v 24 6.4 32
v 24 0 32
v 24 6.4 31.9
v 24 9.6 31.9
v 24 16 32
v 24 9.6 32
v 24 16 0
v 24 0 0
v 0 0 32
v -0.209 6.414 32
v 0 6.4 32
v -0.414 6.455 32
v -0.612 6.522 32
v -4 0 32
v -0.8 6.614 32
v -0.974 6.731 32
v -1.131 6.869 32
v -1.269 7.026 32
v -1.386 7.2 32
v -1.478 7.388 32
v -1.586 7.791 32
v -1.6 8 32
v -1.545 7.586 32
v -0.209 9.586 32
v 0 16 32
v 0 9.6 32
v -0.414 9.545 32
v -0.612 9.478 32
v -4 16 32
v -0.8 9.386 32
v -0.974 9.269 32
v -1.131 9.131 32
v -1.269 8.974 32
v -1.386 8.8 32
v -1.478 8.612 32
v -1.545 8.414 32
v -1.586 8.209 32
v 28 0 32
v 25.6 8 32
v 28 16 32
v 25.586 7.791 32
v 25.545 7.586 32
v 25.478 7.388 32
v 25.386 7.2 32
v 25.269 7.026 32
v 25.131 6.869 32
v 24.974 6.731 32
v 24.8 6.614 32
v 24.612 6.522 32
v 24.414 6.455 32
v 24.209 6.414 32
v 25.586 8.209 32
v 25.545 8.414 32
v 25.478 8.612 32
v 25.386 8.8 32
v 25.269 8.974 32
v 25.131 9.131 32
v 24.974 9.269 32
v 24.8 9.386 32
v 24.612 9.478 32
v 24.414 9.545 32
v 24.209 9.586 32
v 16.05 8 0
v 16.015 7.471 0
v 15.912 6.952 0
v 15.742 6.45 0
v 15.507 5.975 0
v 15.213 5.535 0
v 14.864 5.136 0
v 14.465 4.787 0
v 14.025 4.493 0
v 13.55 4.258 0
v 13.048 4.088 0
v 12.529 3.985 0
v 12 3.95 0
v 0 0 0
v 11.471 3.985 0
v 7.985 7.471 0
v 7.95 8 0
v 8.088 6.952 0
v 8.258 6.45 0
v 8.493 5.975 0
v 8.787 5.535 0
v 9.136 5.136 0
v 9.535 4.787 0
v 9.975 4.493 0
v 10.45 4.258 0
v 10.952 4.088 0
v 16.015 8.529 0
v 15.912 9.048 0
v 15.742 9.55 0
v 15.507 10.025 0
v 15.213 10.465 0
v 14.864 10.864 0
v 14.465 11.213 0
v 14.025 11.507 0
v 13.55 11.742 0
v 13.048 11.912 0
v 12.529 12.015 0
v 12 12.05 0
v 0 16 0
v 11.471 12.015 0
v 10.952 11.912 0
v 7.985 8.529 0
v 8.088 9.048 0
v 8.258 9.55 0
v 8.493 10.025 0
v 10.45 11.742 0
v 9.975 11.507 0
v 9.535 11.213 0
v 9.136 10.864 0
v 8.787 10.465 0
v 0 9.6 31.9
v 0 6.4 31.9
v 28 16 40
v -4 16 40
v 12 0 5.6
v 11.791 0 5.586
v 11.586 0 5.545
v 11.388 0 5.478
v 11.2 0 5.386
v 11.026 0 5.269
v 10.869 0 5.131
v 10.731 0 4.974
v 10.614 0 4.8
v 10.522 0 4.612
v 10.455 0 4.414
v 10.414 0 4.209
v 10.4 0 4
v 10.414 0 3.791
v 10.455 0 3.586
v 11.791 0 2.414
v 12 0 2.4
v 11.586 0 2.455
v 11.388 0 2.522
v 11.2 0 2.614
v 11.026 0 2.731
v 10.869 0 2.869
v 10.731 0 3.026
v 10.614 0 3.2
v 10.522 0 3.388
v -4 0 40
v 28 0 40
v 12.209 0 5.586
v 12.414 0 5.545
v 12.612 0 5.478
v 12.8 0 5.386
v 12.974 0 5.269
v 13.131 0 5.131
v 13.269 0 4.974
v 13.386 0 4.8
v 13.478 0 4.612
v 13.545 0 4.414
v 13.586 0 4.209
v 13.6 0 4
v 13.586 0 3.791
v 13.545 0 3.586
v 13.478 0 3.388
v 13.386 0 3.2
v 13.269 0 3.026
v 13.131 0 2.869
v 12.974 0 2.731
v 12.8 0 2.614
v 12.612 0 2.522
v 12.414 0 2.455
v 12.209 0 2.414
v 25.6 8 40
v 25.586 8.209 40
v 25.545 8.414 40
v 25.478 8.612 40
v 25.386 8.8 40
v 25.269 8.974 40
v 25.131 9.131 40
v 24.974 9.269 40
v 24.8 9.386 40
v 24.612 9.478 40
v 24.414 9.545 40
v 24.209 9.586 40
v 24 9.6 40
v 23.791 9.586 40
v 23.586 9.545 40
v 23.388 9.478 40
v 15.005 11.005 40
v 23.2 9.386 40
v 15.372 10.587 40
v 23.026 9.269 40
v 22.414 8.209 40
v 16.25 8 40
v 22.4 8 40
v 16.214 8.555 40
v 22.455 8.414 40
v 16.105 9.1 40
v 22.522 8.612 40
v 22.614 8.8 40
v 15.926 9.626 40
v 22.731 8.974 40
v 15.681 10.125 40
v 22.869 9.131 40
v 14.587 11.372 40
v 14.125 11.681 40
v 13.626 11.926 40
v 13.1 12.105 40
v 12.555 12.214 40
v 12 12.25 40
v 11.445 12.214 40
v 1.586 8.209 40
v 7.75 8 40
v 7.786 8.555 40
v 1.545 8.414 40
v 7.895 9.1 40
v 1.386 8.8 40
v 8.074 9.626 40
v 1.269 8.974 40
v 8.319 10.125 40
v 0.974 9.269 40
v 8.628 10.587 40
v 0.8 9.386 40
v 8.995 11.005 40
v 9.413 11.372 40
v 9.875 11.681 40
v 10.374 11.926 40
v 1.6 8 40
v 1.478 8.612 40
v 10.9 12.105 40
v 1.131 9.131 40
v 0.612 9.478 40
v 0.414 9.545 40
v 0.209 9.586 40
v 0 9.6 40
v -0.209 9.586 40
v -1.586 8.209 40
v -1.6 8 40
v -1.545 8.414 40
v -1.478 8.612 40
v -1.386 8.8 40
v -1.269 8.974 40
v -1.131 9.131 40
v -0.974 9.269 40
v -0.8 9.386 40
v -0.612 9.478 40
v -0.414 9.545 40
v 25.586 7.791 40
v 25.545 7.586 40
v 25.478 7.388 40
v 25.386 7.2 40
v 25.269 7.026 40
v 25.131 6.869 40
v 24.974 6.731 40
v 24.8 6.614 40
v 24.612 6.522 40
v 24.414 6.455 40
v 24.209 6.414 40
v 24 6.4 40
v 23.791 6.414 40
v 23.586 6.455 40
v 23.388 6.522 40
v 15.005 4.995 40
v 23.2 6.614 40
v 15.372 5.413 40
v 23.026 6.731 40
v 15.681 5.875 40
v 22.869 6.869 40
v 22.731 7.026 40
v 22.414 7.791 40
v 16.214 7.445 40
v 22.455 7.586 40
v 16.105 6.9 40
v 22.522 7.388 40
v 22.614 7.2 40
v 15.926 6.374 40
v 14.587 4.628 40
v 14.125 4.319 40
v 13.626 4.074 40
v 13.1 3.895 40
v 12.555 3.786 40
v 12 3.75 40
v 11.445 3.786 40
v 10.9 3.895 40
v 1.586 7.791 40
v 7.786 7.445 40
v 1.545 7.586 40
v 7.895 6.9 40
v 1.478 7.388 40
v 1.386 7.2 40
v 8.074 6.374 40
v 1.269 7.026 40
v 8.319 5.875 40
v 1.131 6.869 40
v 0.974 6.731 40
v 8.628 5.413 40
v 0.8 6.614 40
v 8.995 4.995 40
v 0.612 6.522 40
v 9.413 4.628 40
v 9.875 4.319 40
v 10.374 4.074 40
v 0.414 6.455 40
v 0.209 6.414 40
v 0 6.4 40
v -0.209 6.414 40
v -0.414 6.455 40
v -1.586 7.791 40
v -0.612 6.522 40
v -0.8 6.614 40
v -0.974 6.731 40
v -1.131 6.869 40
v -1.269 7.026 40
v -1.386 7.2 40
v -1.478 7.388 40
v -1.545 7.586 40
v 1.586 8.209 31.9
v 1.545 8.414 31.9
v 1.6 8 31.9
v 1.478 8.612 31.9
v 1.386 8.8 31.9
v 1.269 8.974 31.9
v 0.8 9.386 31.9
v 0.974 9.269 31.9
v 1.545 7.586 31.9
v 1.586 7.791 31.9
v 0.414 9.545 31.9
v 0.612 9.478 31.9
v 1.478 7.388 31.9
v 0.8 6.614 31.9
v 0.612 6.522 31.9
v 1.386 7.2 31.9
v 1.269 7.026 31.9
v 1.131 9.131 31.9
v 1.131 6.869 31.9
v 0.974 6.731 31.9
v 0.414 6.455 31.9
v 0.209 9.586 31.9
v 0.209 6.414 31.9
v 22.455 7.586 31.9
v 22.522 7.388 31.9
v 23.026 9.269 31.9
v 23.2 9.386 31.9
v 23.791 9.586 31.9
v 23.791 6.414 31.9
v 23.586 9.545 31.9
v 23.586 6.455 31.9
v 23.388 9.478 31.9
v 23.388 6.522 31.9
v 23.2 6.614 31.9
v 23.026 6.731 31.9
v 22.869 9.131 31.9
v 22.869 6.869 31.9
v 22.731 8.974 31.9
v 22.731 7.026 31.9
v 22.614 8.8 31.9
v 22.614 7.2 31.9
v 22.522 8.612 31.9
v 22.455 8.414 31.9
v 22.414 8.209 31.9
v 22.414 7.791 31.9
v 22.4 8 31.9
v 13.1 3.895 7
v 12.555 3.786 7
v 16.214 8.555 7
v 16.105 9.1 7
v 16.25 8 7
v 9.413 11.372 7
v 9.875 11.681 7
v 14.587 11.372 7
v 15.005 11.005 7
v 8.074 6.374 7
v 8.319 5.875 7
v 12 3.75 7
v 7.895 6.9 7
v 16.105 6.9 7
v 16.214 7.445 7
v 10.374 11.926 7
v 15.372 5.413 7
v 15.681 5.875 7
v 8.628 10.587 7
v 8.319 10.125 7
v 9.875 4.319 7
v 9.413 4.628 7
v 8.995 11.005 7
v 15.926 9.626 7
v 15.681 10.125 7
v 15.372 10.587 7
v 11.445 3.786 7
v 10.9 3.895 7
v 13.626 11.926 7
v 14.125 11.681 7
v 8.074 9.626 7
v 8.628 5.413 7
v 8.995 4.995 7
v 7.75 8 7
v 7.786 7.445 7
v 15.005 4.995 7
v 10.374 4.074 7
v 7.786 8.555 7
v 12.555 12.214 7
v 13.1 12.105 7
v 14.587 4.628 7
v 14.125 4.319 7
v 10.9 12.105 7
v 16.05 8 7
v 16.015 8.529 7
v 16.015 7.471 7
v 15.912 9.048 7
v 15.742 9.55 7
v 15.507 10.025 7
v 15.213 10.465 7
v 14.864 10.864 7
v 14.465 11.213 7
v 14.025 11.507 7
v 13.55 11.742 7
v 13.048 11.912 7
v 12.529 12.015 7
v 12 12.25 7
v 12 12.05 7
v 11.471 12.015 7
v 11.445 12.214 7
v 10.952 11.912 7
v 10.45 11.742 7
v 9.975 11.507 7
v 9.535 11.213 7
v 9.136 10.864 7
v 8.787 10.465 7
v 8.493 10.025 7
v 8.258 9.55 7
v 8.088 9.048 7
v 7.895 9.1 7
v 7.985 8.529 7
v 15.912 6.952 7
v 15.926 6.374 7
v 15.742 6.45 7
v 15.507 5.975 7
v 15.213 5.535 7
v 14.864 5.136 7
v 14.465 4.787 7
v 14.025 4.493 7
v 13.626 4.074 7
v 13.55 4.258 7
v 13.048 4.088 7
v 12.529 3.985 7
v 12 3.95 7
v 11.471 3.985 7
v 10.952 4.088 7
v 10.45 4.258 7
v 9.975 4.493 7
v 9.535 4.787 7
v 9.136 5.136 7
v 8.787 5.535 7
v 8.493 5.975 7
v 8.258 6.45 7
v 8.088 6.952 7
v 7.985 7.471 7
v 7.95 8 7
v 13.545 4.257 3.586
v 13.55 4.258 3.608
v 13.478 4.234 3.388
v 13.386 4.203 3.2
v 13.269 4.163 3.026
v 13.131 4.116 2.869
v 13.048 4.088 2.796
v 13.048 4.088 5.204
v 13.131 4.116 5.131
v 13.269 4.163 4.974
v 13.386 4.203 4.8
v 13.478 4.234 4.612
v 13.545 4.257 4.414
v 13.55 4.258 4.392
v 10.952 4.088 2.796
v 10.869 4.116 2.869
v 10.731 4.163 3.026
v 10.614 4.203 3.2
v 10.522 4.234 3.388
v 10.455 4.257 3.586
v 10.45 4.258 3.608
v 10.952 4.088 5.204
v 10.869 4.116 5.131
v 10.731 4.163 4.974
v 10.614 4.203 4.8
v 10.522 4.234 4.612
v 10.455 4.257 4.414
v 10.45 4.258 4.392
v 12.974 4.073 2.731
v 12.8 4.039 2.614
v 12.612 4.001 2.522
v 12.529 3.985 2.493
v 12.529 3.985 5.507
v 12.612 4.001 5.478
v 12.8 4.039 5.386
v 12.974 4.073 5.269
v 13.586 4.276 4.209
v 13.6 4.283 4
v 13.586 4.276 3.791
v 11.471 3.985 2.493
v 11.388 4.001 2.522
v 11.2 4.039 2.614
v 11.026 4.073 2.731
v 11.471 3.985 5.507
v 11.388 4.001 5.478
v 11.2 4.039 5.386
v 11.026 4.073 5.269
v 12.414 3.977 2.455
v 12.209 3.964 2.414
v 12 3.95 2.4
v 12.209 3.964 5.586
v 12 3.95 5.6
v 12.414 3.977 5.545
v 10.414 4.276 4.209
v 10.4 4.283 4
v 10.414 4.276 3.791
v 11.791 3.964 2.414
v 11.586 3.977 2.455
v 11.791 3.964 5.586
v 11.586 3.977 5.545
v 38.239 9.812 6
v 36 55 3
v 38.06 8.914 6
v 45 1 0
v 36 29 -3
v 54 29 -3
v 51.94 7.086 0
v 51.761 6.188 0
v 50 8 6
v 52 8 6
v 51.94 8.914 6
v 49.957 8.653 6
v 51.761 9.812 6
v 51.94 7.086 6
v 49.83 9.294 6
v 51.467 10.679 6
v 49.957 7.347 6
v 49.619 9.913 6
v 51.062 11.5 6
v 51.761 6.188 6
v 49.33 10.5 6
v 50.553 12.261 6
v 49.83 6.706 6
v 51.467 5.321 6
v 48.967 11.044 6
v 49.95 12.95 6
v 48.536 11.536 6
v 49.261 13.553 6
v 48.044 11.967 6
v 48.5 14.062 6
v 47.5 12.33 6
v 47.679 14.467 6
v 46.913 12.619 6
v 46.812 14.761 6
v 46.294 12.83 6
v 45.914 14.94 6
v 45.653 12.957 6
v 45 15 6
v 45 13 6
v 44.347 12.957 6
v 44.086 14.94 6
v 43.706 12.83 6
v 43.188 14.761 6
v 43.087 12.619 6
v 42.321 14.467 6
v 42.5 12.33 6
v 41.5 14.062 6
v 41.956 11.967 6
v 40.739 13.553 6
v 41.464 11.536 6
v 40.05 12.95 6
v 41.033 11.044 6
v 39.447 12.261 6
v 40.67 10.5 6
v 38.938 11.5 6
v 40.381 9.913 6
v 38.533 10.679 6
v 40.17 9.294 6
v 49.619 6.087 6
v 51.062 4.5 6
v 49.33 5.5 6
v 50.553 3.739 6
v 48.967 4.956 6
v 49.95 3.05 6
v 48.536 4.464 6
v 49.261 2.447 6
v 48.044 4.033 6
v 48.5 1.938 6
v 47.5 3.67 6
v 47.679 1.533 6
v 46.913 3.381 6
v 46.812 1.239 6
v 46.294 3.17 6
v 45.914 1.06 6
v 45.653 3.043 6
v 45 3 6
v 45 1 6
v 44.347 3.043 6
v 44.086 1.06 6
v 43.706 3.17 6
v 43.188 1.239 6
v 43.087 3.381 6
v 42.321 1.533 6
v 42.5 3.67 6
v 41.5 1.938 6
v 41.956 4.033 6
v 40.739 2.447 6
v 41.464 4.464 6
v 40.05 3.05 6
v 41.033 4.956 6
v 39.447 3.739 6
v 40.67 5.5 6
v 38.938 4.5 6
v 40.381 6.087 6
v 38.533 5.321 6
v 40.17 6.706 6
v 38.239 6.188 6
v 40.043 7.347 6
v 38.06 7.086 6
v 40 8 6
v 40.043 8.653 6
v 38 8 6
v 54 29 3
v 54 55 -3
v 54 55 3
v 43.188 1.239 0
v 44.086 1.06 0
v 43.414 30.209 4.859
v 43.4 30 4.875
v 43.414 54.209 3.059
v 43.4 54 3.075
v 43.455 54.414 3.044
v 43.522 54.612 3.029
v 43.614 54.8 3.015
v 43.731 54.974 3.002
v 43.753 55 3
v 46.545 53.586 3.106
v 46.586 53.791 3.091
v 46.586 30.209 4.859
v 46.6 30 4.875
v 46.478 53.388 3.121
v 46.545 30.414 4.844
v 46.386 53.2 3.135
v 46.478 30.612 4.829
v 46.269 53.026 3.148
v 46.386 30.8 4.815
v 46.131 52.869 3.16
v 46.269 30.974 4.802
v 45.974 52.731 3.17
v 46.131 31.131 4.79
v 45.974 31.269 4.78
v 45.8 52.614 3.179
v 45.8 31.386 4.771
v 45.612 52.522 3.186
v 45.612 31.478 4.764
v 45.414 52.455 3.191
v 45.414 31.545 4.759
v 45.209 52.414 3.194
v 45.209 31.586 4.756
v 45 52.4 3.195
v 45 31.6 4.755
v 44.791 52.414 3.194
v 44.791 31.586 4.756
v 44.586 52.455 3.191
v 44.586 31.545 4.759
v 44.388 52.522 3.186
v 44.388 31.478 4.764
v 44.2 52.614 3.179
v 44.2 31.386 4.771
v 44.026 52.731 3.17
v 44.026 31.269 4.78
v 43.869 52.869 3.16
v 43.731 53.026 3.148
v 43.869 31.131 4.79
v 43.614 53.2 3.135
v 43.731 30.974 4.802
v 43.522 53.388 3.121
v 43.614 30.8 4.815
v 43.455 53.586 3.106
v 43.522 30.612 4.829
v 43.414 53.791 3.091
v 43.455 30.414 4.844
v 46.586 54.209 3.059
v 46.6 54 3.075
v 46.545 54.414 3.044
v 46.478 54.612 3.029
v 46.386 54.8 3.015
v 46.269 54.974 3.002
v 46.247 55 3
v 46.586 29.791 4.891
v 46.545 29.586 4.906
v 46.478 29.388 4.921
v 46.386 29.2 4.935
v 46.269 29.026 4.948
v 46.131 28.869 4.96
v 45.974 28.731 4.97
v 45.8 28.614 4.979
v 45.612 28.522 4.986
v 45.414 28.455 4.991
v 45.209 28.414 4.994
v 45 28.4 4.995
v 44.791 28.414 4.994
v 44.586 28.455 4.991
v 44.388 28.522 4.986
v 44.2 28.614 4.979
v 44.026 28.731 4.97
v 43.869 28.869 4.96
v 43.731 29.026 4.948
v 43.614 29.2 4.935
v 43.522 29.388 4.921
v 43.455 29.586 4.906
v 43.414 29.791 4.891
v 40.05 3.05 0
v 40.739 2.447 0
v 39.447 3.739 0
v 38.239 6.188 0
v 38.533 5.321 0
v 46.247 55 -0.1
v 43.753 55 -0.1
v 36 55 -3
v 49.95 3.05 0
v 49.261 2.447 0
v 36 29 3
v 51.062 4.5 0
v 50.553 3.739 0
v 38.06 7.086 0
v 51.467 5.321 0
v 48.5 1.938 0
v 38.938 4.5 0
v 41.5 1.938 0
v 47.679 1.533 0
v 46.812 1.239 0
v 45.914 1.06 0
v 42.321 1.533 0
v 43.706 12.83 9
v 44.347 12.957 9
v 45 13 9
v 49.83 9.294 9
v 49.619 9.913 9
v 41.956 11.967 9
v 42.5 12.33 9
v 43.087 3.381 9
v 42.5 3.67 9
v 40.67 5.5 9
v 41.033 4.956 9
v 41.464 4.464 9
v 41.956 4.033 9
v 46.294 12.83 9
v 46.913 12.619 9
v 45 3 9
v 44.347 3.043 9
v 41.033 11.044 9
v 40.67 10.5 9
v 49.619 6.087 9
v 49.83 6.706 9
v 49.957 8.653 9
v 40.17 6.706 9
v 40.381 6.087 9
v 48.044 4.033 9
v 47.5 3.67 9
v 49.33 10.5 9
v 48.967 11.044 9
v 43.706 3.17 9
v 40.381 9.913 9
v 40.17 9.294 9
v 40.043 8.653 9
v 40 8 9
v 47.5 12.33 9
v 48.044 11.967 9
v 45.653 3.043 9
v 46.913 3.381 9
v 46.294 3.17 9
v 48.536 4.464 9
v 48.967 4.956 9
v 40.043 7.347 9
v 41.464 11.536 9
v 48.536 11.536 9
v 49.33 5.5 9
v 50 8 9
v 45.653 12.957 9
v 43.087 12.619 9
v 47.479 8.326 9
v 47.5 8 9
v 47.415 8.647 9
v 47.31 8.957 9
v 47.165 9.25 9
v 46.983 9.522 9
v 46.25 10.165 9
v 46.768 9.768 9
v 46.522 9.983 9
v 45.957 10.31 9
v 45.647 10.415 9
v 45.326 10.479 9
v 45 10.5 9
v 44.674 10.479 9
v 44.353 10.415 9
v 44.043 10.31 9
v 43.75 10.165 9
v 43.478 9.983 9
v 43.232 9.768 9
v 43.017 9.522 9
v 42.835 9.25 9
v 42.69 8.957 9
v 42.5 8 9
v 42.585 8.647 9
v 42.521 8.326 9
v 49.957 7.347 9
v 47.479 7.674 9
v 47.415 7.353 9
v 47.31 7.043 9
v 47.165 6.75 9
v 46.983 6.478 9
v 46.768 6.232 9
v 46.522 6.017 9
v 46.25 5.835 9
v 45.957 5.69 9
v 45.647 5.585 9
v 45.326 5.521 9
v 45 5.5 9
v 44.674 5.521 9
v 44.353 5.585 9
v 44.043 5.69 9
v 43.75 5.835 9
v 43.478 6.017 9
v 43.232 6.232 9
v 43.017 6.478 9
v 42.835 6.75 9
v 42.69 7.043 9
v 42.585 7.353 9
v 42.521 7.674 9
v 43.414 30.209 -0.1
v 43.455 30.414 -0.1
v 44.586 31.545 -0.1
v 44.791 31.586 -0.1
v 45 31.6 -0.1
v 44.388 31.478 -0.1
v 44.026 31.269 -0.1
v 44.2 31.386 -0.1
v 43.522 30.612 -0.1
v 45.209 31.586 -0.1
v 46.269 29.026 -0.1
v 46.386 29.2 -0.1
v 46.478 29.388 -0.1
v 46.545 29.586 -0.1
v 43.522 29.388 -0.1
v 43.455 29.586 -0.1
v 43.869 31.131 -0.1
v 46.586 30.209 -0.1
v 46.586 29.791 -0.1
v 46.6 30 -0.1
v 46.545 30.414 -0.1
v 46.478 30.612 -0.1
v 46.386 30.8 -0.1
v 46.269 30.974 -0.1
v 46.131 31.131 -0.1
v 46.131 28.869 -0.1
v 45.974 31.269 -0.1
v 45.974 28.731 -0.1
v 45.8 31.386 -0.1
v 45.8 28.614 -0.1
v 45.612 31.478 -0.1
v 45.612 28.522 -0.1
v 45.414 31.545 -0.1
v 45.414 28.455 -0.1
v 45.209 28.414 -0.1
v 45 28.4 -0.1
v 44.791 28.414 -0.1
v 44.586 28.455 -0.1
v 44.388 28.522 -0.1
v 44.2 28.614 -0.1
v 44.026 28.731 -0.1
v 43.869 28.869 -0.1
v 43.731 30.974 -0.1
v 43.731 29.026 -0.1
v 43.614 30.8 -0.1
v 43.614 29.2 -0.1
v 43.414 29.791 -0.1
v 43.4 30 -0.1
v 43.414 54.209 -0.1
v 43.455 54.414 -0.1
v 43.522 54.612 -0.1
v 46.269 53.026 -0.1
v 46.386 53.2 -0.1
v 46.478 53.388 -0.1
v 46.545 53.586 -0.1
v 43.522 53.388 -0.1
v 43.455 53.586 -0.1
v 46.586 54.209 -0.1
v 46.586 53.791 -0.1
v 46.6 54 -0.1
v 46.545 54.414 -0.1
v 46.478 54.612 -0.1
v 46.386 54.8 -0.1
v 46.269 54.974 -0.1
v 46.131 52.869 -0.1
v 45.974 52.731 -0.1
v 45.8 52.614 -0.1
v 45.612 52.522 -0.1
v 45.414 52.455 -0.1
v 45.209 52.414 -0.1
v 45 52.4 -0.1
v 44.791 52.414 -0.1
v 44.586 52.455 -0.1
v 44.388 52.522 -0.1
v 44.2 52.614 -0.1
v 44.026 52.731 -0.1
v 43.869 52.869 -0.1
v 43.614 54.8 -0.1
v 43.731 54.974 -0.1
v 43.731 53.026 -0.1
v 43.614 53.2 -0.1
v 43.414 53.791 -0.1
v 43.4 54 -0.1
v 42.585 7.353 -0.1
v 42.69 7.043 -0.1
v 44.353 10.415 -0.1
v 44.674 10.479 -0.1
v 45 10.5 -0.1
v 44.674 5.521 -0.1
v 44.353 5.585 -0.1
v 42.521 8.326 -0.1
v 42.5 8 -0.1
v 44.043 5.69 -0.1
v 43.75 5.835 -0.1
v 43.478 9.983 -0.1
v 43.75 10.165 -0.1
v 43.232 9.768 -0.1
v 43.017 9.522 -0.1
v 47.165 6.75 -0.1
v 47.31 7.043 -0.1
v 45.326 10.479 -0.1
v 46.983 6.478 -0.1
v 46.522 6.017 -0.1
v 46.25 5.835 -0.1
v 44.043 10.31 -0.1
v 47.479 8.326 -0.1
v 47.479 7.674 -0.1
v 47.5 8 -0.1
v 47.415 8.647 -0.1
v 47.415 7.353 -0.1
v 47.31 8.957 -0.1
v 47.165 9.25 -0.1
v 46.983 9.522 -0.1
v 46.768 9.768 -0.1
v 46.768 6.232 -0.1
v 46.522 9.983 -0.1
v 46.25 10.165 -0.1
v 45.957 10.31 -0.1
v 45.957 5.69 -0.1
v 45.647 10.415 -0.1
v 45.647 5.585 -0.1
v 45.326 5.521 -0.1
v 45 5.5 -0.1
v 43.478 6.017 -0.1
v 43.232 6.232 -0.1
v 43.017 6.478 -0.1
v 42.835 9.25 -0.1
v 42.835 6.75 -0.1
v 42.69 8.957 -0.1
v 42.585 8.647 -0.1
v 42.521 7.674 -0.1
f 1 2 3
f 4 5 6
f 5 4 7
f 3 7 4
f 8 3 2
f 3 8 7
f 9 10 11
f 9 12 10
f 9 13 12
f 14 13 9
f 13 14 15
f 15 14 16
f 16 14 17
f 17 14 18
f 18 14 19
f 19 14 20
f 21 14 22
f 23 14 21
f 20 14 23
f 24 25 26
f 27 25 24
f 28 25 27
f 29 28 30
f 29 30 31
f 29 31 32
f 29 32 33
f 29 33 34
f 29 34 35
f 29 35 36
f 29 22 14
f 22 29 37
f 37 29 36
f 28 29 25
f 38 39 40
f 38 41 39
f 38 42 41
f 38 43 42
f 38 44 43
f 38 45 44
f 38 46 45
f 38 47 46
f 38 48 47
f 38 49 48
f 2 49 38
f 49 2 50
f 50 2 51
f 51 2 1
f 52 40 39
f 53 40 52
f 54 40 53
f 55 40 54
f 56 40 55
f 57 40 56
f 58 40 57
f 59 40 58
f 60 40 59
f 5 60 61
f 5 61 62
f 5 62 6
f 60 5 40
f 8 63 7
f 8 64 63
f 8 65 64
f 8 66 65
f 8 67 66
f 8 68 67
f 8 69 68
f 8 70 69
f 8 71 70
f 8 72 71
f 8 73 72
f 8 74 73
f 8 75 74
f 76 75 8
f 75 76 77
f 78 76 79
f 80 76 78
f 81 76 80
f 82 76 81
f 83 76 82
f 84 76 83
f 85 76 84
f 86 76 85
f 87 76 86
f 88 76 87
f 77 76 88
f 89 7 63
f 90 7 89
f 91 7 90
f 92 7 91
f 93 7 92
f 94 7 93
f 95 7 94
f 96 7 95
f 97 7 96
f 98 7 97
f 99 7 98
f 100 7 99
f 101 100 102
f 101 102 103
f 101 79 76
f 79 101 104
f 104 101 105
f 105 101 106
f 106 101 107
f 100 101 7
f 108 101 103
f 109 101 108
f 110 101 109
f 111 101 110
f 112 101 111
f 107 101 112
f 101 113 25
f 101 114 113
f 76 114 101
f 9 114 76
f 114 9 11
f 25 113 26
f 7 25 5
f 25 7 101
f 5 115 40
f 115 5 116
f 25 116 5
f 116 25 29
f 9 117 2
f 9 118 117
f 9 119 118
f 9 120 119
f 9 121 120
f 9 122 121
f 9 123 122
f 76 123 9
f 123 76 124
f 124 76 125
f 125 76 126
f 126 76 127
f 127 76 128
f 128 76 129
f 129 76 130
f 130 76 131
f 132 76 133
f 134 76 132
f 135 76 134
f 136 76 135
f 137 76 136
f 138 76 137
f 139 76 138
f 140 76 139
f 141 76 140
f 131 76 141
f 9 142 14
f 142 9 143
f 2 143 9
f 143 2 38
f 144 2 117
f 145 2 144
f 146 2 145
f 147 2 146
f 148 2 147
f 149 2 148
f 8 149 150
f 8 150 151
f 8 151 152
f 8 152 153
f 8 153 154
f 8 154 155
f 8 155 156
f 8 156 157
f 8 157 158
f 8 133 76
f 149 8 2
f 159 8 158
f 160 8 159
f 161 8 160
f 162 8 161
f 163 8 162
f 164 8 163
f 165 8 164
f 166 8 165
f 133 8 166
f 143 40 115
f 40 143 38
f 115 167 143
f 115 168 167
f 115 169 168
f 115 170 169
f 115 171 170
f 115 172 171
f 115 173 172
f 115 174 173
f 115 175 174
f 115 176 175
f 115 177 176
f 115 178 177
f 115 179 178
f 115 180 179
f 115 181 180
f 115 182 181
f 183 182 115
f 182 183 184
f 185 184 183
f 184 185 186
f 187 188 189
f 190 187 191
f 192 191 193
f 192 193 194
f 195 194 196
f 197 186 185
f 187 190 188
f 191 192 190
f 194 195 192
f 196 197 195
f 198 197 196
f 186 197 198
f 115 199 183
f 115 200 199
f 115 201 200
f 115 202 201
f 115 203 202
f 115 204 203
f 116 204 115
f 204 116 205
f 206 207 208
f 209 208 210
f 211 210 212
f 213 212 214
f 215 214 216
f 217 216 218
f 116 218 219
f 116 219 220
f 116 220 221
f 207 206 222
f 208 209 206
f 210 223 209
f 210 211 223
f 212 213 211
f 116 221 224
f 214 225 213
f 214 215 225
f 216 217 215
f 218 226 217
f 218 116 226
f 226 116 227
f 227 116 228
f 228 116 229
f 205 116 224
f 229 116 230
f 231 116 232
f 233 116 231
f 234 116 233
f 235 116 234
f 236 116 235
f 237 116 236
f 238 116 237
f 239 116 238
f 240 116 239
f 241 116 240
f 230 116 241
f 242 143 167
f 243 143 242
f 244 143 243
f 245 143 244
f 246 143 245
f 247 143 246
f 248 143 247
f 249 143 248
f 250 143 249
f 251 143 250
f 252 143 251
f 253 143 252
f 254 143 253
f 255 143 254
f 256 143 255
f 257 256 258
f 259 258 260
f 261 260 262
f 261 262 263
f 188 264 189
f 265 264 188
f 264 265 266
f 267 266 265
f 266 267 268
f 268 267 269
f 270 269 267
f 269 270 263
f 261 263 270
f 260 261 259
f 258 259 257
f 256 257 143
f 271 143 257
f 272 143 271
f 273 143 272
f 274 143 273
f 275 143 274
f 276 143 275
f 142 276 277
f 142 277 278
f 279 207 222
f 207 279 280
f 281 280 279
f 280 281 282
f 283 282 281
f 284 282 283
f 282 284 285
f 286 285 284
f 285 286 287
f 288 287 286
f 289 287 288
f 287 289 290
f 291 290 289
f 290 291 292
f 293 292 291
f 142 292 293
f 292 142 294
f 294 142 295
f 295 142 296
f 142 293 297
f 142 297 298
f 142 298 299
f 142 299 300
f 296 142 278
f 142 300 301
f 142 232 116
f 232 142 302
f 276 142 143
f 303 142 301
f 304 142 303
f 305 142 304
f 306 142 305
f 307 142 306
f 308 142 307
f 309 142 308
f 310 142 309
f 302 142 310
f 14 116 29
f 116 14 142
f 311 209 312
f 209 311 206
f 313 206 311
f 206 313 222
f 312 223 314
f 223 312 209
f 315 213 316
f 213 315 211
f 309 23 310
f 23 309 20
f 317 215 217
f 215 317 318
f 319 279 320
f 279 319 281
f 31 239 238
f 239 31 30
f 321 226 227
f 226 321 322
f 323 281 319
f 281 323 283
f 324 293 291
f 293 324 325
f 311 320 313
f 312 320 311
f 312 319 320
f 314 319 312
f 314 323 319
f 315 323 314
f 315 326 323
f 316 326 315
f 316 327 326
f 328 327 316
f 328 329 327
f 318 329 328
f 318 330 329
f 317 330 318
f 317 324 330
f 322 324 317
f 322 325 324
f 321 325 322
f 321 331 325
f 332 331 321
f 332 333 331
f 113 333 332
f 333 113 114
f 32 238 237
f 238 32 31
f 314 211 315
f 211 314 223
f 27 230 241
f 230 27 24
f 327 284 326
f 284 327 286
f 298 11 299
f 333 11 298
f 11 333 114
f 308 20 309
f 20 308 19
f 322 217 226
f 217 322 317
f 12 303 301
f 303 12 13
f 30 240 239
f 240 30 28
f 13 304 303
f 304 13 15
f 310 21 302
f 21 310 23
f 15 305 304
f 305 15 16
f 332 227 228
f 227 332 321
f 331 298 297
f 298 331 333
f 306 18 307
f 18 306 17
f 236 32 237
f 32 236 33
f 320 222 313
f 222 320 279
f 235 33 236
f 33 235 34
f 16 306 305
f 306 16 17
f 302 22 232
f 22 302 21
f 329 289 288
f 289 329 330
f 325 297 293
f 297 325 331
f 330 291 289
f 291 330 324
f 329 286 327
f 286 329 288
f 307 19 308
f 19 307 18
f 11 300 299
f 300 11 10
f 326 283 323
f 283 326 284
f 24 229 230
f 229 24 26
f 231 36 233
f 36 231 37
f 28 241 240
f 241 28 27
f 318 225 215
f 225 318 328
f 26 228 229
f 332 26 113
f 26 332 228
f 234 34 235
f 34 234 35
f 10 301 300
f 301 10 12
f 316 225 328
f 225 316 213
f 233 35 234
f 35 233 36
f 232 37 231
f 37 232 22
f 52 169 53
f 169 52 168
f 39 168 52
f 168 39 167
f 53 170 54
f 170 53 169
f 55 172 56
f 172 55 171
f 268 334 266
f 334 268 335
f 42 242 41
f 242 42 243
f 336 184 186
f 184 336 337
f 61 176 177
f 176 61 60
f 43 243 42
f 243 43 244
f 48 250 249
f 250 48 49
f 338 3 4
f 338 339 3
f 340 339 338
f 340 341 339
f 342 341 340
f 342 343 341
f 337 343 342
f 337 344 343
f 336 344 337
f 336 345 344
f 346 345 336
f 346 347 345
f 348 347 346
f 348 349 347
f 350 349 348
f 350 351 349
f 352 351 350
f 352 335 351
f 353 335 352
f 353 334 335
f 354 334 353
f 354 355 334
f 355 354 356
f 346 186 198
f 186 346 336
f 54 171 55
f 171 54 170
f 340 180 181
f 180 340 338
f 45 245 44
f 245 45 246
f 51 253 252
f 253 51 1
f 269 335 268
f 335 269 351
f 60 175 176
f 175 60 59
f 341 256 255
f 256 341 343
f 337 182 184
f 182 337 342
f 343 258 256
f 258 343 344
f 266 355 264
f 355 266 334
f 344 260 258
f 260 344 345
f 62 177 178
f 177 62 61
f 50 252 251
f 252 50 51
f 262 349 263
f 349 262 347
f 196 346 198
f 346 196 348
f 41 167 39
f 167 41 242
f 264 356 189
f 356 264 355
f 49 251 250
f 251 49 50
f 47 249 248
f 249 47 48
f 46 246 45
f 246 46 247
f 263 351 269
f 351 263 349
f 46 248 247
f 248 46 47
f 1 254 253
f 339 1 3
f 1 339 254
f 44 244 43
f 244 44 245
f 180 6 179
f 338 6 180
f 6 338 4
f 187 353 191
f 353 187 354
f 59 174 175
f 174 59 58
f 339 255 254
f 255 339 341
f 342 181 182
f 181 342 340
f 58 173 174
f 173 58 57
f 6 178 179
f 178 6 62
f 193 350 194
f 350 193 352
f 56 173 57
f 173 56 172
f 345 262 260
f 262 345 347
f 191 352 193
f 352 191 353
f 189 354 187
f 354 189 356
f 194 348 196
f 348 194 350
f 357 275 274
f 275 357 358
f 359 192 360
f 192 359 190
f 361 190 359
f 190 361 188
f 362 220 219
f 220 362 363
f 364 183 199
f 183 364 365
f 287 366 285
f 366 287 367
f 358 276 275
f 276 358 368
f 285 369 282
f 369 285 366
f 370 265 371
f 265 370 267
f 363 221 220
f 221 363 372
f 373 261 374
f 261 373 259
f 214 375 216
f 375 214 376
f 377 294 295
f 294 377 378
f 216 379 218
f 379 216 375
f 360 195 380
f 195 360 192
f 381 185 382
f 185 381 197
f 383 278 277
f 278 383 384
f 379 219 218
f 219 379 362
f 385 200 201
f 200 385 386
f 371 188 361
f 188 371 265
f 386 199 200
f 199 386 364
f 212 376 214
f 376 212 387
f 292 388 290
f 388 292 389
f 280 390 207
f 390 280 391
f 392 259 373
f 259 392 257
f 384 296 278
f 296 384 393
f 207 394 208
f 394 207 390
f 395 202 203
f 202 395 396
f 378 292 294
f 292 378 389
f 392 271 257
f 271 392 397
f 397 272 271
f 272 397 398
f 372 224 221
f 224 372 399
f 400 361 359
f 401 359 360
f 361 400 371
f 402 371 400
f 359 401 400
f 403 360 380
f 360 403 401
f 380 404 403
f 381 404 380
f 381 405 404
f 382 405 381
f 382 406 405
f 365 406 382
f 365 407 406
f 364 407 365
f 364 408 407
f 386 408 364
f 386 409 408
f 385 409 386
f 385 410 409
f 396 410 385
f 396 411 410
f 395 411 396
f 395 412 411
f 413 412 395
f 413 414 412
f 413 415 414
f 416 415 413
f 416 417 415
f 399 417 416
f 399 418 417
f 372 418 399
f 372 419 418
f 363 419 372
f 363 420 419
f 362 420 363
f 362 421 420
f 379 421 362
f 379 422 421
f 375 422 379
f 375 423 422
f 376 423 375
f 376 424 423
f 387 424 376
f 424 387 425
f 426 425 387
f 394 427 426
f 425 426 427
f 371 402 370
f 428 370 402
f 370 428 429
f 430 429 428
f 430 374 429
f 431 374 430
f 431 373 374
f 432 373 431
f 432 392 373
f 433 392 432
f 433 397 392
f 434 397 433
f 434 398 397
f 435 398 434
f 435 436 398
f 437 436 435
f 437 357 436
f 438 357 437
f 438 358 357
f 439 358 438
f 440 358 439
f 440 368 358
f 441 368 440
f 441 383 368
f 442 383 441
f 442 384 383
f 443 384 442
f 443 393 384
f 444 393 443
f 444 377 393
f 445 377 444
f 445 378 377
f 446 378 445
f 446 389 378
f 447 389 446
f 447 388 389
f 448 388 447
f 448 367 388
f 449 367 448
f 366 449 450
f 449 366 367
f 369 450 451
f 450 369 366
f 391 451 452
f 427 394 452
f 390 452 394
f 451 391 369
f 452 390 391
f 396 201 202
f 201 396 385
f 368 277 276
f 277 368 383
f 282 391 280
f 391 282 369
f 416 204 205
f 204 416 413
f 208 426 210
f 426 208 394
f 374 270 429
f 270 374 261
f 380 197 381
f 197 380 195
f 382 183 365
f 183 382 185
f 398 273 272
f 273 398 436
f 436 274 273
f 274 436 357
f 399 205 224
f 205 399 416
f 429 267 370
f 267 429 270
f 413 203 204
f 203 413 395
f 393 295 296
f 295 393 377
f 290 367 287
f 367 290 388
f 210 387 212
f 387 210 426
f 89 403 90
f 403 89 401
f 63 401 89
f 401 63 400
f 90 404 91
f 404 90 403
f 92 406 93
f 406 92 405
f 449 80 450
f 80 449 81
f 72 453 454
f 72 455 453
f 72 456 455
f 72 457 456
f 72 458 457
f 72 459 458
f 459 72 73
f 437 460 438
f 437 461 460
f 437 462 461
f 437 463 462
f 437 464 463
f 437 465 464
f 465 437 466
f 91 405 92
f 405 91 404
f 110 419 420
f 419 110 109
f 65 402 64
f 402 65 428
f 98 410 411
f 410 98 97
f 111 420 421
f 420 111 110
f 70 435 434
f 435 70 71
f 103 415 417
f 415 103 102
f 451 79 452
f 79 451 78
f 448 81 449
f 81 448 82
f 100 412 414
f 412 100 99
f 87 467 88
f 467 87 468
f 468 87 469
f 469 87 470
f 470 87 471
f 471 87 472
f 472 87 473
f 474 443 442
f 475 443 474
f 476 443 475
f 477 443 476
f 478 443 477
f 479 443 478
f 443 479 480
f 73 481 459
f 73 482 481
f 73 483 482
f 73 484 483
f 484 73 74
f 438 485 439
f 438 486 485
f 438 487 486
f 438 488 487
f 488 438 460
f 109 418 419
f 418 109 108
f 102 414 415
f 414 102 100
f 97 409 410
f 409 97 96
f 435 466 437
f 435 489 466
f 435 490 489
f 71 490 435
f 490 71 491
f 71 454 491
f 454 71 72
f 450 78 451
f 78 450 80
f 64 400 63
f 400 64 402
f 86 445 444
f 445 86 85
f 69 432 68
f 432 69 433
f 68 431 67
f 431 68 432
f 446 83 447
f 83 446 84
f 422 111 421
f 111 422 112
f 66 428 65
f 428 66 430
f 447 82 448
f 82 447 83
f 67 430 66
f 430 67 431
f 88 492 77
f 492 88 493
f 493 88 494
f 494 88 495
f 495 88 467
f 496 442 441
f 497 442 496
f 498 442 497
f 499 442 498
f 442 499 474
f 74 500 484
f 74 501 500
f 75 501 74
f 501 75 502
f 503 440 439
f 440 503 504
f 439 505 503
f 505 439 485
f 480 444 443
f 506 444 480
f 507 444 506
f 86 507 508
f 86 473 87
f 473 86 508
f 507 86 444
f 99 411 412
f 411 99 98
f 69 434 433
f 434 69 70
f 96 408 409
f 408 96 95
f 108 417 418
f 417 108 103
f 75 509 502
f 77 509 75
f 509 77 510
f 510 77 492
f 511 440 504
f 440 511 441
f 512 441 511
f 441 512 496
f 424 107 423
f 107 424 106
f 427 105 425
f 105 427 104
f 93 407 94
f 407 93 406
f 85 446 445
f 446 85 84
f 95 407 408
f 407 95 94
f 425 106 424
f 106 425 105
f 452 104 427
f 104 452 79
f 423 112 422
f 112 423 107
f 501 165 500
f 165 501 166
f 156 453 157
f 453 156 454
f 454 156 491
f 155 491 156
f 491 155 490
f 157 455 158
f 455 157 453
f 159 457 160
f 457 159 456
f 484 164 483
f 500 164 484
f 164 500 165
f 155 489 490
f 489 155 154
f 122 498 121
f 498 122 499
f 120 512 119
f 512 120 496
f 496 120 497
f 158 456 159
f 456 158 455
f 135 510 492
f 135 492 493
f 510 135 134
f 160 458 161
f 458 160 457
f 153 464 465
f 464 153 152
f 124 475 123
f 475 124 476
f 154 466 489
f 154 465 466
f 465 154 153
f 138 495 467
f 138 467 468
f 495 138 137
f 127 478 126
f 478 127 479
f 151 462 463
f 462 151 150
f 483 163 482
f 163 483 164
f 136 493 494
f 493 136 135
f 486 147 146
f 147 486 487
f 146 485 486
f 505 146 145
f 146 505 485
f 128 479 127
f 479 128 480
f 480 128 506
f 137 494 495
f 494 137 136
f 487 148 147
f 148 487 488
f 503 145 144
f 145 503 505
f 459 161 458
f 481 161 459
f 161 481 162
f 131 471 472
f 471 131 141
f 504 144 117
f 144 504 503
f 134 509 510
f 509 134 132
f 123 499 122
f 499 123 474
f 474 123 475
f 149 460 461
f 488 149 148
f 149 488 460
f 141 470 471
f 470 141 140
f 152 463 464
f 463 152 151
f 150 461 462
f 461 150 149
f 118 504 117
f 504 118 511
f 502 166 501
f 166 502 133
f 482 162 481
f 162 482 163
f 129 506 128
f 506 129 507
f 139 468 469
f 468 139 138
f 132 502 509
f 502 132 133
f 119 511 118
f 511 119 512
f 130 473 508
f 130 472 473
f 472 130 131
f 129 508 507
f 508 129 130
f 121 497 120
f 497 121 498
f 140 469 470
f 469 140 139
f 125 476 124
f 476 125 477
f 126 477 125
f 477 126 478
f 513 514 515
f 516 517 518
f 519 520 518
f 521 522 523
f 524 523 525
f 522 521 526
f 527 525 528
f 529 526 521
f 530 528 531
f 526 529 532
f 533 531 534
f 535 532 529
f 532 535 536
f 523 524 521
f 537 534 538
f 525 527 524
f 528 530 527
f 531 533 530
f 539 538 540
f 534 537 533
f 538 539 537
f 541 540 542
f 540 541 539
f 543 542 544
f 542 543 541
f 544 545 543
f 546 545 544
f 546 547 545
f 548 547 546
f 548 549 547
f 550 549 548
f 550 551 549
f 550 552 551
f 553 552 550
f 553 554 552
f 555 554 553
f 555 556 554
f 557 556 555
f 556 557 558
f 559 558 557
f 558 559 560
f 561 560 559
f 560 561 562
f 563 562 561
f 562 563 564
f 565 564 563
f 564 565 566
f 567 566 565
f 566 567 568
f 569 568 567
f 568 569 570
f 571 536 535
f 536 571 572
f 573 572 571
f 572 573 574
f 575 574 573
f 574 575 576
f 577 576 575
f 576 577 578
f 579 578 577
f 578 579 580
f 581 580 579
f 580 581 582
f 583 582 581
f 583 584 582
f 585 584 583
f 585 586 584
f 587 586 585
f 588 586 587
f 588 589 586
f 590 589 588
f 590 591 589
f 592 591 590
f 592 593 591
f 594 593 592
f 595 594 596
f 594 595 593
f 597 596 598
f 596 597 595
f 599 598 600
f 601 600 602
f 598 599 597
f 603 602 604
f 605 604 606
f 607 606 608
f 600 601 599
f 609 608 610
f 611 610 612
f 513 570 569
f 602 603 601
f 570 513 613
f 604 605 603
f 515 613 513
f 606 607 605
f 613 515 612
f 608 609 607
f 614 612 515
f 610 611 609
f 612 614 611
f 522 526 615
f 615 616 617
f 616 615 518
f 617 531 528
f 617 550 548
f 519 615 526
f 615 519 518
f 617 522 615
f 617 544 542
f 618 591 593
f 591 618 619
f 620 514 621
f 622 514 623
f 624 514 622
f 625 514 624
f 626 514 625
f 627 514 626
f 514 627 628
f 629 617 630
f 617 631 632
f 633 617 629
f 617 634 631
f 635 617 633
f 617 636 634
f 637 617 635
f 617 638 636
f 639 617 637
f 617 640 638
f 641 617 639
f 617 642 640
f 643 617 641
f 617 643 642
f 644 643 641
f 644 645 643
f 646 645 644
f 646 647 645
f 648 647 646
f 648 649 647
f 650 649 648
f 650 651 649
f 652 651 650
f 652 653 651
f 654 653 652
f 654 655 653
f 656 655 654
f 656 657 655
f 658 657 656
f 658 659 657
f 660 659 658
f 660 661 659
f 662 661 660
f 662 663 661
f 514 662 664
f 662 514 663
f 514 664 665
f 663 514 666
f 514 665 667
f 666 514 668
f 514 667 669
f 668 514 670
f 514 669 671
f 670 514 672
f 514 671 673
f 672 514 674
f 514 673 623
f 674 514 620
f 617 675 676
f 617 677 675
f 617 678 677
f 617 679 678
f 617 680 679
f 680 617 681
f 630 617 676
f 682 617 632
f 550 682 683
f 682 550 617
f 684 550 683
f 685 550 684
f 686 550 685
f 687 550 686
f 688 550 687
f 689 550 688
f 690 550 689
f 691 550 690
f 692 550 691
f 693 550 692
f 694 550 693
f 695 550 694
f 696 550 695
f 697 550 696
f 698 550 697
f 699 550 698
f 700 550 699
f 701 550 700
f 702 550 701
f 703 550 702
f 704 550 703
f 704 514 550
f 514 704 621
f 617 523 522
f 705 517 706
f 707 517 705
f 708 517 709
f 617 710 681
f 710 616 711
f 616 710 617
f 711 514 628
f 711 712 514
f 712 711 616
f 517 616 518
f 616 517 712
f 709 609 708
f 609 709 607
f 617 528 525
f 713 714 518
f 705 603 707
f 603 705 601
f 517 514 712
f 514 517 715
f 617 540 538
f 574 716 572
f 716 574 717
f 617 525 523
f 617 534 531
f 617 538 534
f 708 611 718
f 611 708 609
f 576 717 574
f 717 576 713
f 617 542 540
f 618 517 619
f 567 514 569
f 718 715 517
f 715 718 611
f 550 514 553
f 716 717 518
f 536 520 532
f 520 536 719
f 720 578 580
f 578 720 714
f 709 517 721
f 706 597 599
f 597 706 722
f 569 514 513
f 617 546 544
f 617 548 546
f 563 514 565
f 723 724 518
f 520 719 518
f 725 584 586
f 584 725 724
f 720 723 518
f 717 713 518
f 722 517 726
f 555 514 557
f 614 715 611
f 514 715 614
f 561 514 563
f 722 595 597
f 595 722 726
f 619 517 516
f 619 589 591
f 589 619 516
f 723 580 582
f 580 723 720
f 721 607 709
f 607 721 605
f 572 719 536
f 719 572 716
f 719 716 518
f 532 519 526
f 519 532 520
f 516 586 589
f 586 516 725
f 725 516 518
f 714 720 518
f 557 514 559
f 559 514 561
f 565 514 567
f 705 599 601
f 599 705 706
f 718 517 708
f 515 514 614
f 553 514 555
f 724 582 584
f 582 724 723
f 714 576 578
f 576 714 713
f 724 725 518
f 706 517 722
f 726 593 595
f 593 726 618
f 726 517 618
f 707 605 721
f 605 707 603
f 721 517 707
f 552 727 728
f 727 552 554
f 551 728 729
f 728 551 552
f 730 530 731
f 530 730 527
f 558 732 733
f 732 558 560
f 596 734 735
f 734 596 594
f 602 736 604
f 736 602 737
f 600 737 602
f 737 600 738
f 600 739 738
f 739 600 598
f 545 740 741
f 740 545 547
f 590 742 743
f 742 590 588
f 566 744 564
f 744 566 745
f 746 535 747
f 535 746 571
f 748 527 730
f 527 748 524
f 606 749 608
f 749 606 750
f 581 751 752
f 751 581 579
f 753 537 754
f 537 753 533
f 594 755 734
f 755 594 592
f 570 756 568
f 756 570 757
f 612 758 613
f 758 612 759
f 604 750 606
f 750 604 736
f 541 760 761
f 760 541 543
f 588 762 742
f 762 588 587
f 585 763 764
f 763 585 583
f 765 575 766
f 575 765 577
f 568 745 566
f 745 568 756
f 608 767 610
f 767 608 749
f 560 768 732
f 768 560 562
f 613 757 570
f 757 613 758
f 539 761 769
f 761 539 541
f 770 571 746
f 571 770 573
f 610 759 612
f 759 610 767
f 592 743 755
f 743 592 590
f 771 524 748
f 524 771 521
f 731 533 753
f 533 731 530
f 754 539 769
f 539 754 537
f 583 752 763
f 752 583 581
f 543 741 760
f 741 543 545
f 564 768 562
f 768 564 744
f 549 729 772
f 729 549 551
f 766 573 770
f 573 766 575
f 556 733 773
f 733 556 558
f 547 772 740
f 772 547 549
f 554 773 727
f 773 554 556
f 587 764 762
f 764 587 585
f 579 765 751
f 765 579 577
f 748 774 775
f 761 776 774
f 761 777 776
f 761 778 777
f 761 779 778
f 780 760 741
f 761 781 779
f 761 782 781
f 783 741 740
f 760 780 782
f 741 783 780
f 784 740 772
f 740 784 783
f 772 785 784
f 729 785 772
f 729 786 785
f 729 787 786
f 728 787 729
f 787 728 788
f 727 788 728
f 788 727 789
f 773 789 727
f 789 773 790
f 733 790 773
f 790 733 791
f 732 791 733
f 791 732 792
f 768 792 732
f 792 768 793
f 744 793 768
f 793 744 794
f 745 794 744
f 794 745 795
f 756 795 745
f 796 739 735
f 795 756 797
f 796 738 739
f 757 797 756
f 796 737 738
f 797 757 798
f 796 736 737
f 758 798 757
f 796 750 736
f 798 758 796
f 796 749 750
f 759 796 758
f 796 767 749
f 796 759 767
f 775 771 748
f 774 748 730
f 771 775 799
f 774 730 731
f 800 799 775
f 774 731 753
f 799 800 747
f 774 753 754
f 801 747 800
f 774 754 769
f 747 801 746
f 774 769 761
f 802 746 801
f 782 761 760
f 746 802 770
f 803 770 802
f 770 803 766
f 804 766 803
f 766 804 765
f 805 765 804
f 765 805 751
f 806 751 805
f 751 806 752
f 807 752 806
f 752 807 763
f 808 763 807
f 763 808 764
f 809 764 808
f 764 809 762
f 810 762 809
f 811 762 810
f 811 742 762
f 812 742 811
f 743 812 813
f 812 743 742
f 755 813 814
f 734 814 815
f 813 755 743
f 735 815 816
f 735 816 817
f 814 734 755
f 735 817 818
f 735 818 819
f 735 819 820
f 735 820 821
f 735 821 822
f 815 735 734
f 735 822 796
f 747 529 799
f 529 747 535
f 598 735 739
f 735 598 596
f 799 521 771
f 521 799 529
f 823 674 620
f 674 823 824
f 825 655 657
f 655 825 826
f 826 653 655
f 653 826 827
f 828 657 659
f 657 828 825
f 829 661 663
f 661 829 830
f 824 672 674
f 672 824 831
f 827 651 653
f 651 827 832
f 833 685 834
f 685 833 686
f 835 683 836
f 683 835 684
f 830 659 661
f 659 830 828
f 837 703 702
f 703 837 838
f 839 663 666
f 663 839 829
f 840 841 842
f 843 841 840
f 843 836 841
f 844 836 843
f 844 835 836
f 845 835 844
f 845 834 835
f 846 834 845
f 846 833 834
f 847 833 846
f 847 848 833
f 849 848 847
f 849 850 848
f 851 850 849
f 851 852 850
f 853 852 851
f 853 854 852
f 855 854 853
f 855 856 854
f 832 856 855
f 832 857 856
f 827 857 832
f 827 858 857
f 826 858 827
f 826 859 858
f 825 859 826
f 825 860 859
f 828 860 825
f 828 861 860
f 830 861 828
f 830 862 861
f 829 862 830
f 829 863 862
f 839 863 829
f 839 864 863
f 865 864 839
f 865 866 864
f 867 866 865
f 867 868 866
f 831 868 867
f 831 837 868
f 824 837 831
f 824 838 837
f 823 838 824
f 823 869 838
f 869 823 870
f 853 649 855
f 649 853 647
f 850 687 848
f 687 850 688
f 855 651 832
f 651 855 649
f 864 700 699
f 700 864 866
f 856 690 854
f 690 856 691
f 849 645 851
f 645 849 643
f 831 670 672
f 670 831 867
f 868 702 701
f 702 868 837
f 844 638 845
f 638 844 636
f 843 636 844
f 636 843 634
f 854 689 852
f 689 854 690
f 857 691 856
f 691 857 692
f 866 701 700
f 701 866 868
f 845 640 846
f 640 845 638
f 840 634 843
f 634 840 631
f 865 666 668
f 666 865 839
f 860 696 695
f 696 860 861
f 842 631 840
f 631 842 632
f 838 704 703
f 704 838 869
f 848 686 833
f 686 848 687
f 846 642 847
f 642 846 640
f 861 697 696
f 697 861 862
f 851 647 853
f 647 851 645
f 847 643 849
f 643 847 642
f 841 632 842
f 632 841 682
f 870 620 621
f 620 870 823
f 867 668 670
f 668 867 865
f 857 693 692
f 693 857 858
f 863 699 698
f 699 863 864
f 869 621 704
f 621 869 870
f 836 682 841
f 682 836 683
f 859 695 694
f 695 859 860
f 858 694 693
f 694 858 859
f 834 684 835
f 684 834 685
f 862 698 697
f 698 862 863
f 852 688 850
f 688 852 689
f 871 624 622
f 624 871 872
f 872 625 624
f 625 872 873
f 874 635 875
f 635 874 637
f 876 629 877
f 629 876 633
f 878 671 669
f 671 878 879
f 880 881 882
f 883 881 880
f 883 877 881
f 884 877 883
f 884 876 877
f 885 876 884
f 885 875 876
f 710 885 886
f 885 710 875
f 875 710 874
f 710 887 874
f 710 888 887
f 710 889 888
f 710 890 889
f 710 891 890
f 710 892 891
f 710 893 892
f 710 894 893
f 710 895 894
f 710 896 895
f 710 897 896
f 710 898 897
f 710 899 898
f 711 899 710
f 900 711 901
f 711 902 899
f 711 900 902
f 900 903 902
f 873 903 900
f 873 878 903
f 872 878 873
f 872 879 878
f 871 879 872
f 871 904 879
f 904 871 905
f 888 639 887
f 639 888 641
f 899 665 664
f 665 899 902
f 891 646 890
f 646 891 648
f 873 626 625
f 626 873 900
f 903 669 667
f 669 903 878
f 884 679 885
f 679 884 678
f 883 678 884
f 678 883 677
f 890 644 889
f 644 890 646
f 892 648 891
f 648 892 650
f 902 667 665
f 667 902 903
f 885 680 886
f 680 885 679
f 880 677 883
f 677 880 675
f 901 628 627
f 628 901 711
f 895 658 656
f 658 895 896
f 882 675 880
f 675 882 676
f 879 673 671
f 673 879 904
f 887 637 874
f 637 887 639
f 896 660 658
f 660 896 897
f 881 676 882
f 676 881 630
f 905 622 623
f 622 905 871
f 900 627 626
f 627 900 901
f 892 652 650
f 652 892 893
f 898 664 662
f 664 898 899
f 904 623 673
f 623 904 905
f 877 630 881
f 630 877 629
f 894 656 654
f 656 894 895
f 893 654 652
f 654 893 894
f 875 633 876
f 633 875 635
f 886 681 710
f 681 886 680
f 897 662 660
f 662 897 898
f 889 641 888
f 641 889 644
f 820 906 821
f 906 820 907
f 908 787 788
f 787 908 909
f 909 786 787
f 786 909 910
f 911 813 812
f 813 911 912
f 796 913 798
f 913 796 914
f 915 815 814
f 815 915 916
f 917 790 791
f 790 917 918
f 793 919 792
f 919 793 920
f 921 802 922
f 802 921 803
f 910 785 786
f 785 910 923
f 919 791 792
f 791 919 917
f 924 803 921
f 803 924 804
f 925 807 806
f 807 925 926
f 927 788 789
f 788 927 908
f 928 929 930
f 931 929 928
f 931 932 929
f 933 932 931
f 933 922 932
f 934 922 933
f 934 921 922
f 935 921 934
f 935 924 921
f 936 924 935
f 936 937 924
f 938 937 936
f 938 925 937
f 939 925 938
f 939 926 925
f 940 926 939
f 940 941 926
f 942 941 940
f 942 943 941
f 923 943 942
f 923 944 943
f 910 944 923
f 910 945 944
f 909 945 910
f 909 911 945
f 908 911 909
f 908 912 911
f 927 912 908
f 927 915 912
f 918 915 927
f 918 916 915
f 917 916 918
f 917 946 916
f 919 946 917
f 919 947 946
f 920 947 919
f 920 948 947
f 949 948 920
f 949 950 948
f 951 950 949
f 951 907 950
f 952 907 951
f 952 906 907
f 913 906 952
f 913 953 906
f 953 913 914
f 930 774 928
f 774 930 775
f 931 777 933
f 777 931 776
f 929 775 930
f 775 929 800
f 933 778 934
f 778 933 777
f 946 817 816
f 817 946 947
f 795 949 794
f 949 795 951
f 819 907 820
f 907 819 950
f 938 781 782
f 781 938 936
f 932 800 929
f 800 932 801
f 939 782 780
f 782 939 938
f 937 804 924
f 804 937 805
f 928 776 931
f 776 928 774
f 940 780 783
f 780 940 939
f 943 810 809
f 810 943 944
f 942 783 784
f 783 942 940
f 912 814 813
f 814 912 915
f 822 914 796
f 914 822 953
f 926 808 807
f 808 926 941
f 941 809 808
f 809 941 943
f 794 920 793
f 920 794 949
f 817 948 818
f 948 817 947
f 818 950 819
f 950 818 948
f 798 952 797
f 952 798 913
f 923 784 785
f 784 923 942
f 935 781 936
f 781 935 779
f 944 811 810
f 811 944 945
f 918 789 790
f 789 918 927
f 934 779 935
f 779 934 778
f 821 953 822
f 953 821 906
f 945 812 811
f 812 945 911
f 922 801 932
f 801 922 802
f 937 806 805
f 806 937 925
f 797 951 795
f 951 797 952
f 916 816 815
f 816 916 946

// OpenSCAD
// file: 00_config.scad
// 00_config.scad — shared dimensions for the AndroidTester machine, in mm.
//
// These constants are the single source for every part in cad/openscad/.
// They are cross-checked by tests/test_design_package.py against
// androidtester/config.py (deck size, clearance planes) and
// firmware/klipper/androidtester.cfg (position_max) — change them together.

// -- deck and travels -------------------------------------------------------
// Deck == reachable XY (cfg position_max == config.py deck defaults).
DECK_W   = 400;          // deck X, config.py deck_width_mm, stepper_x position_max
DECK_D   = 300;          // deck Y, config.py deck_height_mm, stepper_y position_max
X_TRAVEL = 400;          // == DECK_W
Y_TRAVEL = 300;          // == DECK_D
Z_TRAVEL = 60;           // tool-Z elevator travel (manual_stepper tool_z)
TRAVEL_Z = 40;           // clearance plane, config.py travel_z_mm
TOUCH_Z  = 5;            // finger-tip contact plane, config.py touch_z_mm

// -- linear rails -------------------------------------------------------------
// X rail: must span the full X travel plus the carriage plus end margins:
//   X_TRAVEL (400) + X_CARRIAGE_LEN (45) + 2*END_MARGIN (10) = 465 mm min
//   -> RAIL_X_LEN = 500 (next stock MGN12 length, 35 mm of setup slack).
// Y rails (x2, carry the gantry beam):
//   Y_TRAVEL (300) + X_CARRIAGE_LEN (45) + 2*END_MARGIN (10) = 365 mm min
//   -> RAIL_Y_LEN = 400.
// Z rail (tool elevator, MGN9):
//   Z_TRAVEL (60) + Z_CARRIAGE_LEN (40) + 2*END_MARGIN (10) = 120 mm min
//   -> RAIL_Z_LEN = 150.
RAIL_X_LEN = 500;
RAIL_Y_LEN = 400;
RAIL_Z_LEN = 150;
X_CARRIAGE_LEN = 45;     // MGN12H block, 27 x 45.4 mm (nominal — verify rail vendor)
Z_CARRIAGE_LEN = 40;     // MGN9H block, 20 x 38.9 mm (nominal — verify rail vendor)
END_MARGIN   = 10;       // endstop trigger + belt/idler clearance at each rail end
RAIL12_W = 12;           // MGN12 rail width / height
RAIL12_H = 8;
RAIL9_W  = 9;            // MGN9 rail width / height
RAIL9_H  = 6.5;

// -- frame --------------------------------------------------------------------
EXT = 20;                // 2020 aluminium extrusion (6 mm slot)
FRAME_W = DECK_W + 100;  // 500 — gantry beam carries the full X rail (500)
FRAME_D = DECK_D + 100;  // 400 — side beams carry the full Y rails (400)
POST_H  = 200;           // gantry posts above the base frame
CAM_POST_H = 400;        // overhead camera post above the deck

// -- motors / motion hardware ---------------------------------------------------
NEMA_W   = 42.3;         // NEMA17 face
NEMA_HOLE_SP = 31;       // NEMA17 M3 hole spacing
NEMA_BORE  = 22.2;       // NEMA17 pilot bore (clearance)
PULLEY_D = 12.2;         // GT2 20T pulley OD (2 mm pitch x 20 T = 40 mm/rev)
IDLER_D  = 12.2;         // GT2 20T idler OD, 5 mm bore
BELT_W   = 6;            // GT2 belt width
LEAD_D   = 8;            // T8 lead screw (2 mm pitch x 4 starts = 8 mm/rev)

// -- servos (SG90 / MG90S class) -------------------------------------------------
SERVO_W   = 23;          // body across tabs axis
SERVO_D   = 12.5;        // body depth
SERVO_H   = 23;          // body height below the mounting tabs
SERVO_TAB_W = 32.5;      // across the mounting tabs
SERVO_SHAFT_D = 5;       // output shaft / horn boss clearance
SERVO_SHAFT_OFF = 6;     // shaft centre from body end wall

// -- finger tool -----------------------------------------------------------------
FINGER_TIP_D  = 8;       // conductive tip diameter
FINGER_SHAFT_D = 6;      // plunger shaft
SPRING_D  = 8.5;         // compression-spring pocket (Ø8 spring, k ≈ 0.5 N/mm)
FINGER_STROKE = 15;      // spring working stroke (3–12 mm compression -> 1.5–6 N)

// -- fasteners ---------------------------------------------------------------------
M3_CLEAR = 3.2;
M4_CLEAR = 4.2;
M5_CLEAR = 5.3;
M3_HEAD  = 6.0;          // M3 button-head clearance

// -- device nest ---------------------------------------------------------------------
DEVICE_MAX_W = 280;      // phones through ~11" tablets (250 x 170 + case)
DEVICE_MAX_D = 200;
NEST_STOP_H  = 8;        // stop height: below screen, clear of ArUco markers
NEST_CLEAR   = 40;       // keep-out at each deck corner (ArUco marker zone)

$fn = 48;
// main file
// finger_module.scad — the touch tool: a spring-loaded plunger with a
// conductive tip, carried on a servo-deployed swing arm (deploy = vertical
// working position, stow = swung clear for nest access).
//
// Tap force comes from the spring, not the Z drive: the tool-Z descends to
// TOUCH_Z with the tip already on the glass, compressing the spring 3–12 mm
// for 1.5–6 N (see docs/01-mechanical.md).
//
// Parts (PART selector):
//   finger_body — plunger housing: spring pocket, shaft guide, tip socket
//   deploy_arm  — swings the body on the finger_deploy servo (MG90S)
//
// Export: openscad -o finger_body.stl -D 'PART="finger_body"' finger_module.scad
include <00_config.scad>

PART = is_undef(_AT_PART) ? "preview" : _AT_PART;  // -D 'PART=...' or a render wrapper overrides

BODY_W = 24;
BODY_D = 16;
BODY_H = 40;             // spring pocket + guide + tip socket stack

module finger_body() {
    mount_h = 8;         // top mounting flange height
    difference() {
        union() {
            cube([BODY_W, BODY_D, BODY_H - mount_h]);
            translate([-4, 0, BODY_H - mount_h]) cube([BODY_W + 8, BODY_D, mount_h]);
        }
        // spring pocket open at the flange top: Ø8.5 (Ø8 spring, k ≈ 0.5 N/mm);
        // the toolhead plate above retains the spring once bolted down
        translate([BODY_W / 2, BODY_D / 2, BODY_H - mount_h - 25])
            cylinder(d = SPRING_D, h = 25 + mount_h + 0.1);
        // shaft guide Ø6.2 through the rest of the body
        translate([BODY_W / 2, BODY_D / 2, -0.1])
            cylinder(d = FINGER_SHAFT_D + 0.2, h = BODY_H);
        // tip socket: conductive tip Ø8 shank, 8 mm deep, from the bottom
        translate([BODY_W / 2, BODY_D / 2, -0.1])
            cylinder(d = FINGER_TIP_D + 0.1, h = 8);
        // M3 grub screw into the tip shank, from the +Y face
        translate([BODY_W / 2, -0.1, 4])
            rotate([-90, 0, 0]) cylinder(d = M3_CLEAR, h = BODY_D / 2 + 0.2);
        // mount holes matching the toolhead plate finger pattern (24 mm)
        for (sx = [-1, 1])
            translate([BODY_W / 2 + sx * 12, BODY_D / 2, BODY_H - mount_h - 0.1])
                cylinder(d = M3_CLEAR, h = mount_h + 0.2);
    }
}

// Servo swing arm: clamps on the finger_deploy servo horn boss, carries the
// finger body at its end. 90° swing = deploy (down) / stow (flat).
module deploy_arm() {
    arm_l = 34;          // shaft centre to body centre
    h = 6;
    difference() {
        union() {
            hull() {
                cylinder(d = 14, h = h);                       // hub
                // end pad covers the finger body's 24 mm M3 pattern
                translate([arm_l, 0, 0]) cube([26, 18, h], center = true);
            }
            cylinder(d = 10, h = h + 3);                       // horn boss
        }
        // horn boss bore + M3 horn screw
        translate([0, 0, -0.1]) cylinder(d = SERVO_SHAFT_D, h = h + 3.2);
        translate([0, 0, h + 1]) cylinder(d = M3_CLEAR, h = 2.2);
        // finger body bolts: 2 x M3 on the 24 mm pattern
        for (sx = [-1, 1])
            translate([arm_l + sx * 12, 0, -0.1])
                cylinder(d = M3_CLEAR, h = h + 0.2);
    }
}

// -- preview / selector ---------------------------------------------------------
if (PART == "preview" || PART == "finger_body")
    finger_body();
if (PART == "preview")
    translate([45, 8, 0]) rotate([0, 0, 90]) deploy_arm();
else if (PART == "deploy_arm")
    deploy_arm();
